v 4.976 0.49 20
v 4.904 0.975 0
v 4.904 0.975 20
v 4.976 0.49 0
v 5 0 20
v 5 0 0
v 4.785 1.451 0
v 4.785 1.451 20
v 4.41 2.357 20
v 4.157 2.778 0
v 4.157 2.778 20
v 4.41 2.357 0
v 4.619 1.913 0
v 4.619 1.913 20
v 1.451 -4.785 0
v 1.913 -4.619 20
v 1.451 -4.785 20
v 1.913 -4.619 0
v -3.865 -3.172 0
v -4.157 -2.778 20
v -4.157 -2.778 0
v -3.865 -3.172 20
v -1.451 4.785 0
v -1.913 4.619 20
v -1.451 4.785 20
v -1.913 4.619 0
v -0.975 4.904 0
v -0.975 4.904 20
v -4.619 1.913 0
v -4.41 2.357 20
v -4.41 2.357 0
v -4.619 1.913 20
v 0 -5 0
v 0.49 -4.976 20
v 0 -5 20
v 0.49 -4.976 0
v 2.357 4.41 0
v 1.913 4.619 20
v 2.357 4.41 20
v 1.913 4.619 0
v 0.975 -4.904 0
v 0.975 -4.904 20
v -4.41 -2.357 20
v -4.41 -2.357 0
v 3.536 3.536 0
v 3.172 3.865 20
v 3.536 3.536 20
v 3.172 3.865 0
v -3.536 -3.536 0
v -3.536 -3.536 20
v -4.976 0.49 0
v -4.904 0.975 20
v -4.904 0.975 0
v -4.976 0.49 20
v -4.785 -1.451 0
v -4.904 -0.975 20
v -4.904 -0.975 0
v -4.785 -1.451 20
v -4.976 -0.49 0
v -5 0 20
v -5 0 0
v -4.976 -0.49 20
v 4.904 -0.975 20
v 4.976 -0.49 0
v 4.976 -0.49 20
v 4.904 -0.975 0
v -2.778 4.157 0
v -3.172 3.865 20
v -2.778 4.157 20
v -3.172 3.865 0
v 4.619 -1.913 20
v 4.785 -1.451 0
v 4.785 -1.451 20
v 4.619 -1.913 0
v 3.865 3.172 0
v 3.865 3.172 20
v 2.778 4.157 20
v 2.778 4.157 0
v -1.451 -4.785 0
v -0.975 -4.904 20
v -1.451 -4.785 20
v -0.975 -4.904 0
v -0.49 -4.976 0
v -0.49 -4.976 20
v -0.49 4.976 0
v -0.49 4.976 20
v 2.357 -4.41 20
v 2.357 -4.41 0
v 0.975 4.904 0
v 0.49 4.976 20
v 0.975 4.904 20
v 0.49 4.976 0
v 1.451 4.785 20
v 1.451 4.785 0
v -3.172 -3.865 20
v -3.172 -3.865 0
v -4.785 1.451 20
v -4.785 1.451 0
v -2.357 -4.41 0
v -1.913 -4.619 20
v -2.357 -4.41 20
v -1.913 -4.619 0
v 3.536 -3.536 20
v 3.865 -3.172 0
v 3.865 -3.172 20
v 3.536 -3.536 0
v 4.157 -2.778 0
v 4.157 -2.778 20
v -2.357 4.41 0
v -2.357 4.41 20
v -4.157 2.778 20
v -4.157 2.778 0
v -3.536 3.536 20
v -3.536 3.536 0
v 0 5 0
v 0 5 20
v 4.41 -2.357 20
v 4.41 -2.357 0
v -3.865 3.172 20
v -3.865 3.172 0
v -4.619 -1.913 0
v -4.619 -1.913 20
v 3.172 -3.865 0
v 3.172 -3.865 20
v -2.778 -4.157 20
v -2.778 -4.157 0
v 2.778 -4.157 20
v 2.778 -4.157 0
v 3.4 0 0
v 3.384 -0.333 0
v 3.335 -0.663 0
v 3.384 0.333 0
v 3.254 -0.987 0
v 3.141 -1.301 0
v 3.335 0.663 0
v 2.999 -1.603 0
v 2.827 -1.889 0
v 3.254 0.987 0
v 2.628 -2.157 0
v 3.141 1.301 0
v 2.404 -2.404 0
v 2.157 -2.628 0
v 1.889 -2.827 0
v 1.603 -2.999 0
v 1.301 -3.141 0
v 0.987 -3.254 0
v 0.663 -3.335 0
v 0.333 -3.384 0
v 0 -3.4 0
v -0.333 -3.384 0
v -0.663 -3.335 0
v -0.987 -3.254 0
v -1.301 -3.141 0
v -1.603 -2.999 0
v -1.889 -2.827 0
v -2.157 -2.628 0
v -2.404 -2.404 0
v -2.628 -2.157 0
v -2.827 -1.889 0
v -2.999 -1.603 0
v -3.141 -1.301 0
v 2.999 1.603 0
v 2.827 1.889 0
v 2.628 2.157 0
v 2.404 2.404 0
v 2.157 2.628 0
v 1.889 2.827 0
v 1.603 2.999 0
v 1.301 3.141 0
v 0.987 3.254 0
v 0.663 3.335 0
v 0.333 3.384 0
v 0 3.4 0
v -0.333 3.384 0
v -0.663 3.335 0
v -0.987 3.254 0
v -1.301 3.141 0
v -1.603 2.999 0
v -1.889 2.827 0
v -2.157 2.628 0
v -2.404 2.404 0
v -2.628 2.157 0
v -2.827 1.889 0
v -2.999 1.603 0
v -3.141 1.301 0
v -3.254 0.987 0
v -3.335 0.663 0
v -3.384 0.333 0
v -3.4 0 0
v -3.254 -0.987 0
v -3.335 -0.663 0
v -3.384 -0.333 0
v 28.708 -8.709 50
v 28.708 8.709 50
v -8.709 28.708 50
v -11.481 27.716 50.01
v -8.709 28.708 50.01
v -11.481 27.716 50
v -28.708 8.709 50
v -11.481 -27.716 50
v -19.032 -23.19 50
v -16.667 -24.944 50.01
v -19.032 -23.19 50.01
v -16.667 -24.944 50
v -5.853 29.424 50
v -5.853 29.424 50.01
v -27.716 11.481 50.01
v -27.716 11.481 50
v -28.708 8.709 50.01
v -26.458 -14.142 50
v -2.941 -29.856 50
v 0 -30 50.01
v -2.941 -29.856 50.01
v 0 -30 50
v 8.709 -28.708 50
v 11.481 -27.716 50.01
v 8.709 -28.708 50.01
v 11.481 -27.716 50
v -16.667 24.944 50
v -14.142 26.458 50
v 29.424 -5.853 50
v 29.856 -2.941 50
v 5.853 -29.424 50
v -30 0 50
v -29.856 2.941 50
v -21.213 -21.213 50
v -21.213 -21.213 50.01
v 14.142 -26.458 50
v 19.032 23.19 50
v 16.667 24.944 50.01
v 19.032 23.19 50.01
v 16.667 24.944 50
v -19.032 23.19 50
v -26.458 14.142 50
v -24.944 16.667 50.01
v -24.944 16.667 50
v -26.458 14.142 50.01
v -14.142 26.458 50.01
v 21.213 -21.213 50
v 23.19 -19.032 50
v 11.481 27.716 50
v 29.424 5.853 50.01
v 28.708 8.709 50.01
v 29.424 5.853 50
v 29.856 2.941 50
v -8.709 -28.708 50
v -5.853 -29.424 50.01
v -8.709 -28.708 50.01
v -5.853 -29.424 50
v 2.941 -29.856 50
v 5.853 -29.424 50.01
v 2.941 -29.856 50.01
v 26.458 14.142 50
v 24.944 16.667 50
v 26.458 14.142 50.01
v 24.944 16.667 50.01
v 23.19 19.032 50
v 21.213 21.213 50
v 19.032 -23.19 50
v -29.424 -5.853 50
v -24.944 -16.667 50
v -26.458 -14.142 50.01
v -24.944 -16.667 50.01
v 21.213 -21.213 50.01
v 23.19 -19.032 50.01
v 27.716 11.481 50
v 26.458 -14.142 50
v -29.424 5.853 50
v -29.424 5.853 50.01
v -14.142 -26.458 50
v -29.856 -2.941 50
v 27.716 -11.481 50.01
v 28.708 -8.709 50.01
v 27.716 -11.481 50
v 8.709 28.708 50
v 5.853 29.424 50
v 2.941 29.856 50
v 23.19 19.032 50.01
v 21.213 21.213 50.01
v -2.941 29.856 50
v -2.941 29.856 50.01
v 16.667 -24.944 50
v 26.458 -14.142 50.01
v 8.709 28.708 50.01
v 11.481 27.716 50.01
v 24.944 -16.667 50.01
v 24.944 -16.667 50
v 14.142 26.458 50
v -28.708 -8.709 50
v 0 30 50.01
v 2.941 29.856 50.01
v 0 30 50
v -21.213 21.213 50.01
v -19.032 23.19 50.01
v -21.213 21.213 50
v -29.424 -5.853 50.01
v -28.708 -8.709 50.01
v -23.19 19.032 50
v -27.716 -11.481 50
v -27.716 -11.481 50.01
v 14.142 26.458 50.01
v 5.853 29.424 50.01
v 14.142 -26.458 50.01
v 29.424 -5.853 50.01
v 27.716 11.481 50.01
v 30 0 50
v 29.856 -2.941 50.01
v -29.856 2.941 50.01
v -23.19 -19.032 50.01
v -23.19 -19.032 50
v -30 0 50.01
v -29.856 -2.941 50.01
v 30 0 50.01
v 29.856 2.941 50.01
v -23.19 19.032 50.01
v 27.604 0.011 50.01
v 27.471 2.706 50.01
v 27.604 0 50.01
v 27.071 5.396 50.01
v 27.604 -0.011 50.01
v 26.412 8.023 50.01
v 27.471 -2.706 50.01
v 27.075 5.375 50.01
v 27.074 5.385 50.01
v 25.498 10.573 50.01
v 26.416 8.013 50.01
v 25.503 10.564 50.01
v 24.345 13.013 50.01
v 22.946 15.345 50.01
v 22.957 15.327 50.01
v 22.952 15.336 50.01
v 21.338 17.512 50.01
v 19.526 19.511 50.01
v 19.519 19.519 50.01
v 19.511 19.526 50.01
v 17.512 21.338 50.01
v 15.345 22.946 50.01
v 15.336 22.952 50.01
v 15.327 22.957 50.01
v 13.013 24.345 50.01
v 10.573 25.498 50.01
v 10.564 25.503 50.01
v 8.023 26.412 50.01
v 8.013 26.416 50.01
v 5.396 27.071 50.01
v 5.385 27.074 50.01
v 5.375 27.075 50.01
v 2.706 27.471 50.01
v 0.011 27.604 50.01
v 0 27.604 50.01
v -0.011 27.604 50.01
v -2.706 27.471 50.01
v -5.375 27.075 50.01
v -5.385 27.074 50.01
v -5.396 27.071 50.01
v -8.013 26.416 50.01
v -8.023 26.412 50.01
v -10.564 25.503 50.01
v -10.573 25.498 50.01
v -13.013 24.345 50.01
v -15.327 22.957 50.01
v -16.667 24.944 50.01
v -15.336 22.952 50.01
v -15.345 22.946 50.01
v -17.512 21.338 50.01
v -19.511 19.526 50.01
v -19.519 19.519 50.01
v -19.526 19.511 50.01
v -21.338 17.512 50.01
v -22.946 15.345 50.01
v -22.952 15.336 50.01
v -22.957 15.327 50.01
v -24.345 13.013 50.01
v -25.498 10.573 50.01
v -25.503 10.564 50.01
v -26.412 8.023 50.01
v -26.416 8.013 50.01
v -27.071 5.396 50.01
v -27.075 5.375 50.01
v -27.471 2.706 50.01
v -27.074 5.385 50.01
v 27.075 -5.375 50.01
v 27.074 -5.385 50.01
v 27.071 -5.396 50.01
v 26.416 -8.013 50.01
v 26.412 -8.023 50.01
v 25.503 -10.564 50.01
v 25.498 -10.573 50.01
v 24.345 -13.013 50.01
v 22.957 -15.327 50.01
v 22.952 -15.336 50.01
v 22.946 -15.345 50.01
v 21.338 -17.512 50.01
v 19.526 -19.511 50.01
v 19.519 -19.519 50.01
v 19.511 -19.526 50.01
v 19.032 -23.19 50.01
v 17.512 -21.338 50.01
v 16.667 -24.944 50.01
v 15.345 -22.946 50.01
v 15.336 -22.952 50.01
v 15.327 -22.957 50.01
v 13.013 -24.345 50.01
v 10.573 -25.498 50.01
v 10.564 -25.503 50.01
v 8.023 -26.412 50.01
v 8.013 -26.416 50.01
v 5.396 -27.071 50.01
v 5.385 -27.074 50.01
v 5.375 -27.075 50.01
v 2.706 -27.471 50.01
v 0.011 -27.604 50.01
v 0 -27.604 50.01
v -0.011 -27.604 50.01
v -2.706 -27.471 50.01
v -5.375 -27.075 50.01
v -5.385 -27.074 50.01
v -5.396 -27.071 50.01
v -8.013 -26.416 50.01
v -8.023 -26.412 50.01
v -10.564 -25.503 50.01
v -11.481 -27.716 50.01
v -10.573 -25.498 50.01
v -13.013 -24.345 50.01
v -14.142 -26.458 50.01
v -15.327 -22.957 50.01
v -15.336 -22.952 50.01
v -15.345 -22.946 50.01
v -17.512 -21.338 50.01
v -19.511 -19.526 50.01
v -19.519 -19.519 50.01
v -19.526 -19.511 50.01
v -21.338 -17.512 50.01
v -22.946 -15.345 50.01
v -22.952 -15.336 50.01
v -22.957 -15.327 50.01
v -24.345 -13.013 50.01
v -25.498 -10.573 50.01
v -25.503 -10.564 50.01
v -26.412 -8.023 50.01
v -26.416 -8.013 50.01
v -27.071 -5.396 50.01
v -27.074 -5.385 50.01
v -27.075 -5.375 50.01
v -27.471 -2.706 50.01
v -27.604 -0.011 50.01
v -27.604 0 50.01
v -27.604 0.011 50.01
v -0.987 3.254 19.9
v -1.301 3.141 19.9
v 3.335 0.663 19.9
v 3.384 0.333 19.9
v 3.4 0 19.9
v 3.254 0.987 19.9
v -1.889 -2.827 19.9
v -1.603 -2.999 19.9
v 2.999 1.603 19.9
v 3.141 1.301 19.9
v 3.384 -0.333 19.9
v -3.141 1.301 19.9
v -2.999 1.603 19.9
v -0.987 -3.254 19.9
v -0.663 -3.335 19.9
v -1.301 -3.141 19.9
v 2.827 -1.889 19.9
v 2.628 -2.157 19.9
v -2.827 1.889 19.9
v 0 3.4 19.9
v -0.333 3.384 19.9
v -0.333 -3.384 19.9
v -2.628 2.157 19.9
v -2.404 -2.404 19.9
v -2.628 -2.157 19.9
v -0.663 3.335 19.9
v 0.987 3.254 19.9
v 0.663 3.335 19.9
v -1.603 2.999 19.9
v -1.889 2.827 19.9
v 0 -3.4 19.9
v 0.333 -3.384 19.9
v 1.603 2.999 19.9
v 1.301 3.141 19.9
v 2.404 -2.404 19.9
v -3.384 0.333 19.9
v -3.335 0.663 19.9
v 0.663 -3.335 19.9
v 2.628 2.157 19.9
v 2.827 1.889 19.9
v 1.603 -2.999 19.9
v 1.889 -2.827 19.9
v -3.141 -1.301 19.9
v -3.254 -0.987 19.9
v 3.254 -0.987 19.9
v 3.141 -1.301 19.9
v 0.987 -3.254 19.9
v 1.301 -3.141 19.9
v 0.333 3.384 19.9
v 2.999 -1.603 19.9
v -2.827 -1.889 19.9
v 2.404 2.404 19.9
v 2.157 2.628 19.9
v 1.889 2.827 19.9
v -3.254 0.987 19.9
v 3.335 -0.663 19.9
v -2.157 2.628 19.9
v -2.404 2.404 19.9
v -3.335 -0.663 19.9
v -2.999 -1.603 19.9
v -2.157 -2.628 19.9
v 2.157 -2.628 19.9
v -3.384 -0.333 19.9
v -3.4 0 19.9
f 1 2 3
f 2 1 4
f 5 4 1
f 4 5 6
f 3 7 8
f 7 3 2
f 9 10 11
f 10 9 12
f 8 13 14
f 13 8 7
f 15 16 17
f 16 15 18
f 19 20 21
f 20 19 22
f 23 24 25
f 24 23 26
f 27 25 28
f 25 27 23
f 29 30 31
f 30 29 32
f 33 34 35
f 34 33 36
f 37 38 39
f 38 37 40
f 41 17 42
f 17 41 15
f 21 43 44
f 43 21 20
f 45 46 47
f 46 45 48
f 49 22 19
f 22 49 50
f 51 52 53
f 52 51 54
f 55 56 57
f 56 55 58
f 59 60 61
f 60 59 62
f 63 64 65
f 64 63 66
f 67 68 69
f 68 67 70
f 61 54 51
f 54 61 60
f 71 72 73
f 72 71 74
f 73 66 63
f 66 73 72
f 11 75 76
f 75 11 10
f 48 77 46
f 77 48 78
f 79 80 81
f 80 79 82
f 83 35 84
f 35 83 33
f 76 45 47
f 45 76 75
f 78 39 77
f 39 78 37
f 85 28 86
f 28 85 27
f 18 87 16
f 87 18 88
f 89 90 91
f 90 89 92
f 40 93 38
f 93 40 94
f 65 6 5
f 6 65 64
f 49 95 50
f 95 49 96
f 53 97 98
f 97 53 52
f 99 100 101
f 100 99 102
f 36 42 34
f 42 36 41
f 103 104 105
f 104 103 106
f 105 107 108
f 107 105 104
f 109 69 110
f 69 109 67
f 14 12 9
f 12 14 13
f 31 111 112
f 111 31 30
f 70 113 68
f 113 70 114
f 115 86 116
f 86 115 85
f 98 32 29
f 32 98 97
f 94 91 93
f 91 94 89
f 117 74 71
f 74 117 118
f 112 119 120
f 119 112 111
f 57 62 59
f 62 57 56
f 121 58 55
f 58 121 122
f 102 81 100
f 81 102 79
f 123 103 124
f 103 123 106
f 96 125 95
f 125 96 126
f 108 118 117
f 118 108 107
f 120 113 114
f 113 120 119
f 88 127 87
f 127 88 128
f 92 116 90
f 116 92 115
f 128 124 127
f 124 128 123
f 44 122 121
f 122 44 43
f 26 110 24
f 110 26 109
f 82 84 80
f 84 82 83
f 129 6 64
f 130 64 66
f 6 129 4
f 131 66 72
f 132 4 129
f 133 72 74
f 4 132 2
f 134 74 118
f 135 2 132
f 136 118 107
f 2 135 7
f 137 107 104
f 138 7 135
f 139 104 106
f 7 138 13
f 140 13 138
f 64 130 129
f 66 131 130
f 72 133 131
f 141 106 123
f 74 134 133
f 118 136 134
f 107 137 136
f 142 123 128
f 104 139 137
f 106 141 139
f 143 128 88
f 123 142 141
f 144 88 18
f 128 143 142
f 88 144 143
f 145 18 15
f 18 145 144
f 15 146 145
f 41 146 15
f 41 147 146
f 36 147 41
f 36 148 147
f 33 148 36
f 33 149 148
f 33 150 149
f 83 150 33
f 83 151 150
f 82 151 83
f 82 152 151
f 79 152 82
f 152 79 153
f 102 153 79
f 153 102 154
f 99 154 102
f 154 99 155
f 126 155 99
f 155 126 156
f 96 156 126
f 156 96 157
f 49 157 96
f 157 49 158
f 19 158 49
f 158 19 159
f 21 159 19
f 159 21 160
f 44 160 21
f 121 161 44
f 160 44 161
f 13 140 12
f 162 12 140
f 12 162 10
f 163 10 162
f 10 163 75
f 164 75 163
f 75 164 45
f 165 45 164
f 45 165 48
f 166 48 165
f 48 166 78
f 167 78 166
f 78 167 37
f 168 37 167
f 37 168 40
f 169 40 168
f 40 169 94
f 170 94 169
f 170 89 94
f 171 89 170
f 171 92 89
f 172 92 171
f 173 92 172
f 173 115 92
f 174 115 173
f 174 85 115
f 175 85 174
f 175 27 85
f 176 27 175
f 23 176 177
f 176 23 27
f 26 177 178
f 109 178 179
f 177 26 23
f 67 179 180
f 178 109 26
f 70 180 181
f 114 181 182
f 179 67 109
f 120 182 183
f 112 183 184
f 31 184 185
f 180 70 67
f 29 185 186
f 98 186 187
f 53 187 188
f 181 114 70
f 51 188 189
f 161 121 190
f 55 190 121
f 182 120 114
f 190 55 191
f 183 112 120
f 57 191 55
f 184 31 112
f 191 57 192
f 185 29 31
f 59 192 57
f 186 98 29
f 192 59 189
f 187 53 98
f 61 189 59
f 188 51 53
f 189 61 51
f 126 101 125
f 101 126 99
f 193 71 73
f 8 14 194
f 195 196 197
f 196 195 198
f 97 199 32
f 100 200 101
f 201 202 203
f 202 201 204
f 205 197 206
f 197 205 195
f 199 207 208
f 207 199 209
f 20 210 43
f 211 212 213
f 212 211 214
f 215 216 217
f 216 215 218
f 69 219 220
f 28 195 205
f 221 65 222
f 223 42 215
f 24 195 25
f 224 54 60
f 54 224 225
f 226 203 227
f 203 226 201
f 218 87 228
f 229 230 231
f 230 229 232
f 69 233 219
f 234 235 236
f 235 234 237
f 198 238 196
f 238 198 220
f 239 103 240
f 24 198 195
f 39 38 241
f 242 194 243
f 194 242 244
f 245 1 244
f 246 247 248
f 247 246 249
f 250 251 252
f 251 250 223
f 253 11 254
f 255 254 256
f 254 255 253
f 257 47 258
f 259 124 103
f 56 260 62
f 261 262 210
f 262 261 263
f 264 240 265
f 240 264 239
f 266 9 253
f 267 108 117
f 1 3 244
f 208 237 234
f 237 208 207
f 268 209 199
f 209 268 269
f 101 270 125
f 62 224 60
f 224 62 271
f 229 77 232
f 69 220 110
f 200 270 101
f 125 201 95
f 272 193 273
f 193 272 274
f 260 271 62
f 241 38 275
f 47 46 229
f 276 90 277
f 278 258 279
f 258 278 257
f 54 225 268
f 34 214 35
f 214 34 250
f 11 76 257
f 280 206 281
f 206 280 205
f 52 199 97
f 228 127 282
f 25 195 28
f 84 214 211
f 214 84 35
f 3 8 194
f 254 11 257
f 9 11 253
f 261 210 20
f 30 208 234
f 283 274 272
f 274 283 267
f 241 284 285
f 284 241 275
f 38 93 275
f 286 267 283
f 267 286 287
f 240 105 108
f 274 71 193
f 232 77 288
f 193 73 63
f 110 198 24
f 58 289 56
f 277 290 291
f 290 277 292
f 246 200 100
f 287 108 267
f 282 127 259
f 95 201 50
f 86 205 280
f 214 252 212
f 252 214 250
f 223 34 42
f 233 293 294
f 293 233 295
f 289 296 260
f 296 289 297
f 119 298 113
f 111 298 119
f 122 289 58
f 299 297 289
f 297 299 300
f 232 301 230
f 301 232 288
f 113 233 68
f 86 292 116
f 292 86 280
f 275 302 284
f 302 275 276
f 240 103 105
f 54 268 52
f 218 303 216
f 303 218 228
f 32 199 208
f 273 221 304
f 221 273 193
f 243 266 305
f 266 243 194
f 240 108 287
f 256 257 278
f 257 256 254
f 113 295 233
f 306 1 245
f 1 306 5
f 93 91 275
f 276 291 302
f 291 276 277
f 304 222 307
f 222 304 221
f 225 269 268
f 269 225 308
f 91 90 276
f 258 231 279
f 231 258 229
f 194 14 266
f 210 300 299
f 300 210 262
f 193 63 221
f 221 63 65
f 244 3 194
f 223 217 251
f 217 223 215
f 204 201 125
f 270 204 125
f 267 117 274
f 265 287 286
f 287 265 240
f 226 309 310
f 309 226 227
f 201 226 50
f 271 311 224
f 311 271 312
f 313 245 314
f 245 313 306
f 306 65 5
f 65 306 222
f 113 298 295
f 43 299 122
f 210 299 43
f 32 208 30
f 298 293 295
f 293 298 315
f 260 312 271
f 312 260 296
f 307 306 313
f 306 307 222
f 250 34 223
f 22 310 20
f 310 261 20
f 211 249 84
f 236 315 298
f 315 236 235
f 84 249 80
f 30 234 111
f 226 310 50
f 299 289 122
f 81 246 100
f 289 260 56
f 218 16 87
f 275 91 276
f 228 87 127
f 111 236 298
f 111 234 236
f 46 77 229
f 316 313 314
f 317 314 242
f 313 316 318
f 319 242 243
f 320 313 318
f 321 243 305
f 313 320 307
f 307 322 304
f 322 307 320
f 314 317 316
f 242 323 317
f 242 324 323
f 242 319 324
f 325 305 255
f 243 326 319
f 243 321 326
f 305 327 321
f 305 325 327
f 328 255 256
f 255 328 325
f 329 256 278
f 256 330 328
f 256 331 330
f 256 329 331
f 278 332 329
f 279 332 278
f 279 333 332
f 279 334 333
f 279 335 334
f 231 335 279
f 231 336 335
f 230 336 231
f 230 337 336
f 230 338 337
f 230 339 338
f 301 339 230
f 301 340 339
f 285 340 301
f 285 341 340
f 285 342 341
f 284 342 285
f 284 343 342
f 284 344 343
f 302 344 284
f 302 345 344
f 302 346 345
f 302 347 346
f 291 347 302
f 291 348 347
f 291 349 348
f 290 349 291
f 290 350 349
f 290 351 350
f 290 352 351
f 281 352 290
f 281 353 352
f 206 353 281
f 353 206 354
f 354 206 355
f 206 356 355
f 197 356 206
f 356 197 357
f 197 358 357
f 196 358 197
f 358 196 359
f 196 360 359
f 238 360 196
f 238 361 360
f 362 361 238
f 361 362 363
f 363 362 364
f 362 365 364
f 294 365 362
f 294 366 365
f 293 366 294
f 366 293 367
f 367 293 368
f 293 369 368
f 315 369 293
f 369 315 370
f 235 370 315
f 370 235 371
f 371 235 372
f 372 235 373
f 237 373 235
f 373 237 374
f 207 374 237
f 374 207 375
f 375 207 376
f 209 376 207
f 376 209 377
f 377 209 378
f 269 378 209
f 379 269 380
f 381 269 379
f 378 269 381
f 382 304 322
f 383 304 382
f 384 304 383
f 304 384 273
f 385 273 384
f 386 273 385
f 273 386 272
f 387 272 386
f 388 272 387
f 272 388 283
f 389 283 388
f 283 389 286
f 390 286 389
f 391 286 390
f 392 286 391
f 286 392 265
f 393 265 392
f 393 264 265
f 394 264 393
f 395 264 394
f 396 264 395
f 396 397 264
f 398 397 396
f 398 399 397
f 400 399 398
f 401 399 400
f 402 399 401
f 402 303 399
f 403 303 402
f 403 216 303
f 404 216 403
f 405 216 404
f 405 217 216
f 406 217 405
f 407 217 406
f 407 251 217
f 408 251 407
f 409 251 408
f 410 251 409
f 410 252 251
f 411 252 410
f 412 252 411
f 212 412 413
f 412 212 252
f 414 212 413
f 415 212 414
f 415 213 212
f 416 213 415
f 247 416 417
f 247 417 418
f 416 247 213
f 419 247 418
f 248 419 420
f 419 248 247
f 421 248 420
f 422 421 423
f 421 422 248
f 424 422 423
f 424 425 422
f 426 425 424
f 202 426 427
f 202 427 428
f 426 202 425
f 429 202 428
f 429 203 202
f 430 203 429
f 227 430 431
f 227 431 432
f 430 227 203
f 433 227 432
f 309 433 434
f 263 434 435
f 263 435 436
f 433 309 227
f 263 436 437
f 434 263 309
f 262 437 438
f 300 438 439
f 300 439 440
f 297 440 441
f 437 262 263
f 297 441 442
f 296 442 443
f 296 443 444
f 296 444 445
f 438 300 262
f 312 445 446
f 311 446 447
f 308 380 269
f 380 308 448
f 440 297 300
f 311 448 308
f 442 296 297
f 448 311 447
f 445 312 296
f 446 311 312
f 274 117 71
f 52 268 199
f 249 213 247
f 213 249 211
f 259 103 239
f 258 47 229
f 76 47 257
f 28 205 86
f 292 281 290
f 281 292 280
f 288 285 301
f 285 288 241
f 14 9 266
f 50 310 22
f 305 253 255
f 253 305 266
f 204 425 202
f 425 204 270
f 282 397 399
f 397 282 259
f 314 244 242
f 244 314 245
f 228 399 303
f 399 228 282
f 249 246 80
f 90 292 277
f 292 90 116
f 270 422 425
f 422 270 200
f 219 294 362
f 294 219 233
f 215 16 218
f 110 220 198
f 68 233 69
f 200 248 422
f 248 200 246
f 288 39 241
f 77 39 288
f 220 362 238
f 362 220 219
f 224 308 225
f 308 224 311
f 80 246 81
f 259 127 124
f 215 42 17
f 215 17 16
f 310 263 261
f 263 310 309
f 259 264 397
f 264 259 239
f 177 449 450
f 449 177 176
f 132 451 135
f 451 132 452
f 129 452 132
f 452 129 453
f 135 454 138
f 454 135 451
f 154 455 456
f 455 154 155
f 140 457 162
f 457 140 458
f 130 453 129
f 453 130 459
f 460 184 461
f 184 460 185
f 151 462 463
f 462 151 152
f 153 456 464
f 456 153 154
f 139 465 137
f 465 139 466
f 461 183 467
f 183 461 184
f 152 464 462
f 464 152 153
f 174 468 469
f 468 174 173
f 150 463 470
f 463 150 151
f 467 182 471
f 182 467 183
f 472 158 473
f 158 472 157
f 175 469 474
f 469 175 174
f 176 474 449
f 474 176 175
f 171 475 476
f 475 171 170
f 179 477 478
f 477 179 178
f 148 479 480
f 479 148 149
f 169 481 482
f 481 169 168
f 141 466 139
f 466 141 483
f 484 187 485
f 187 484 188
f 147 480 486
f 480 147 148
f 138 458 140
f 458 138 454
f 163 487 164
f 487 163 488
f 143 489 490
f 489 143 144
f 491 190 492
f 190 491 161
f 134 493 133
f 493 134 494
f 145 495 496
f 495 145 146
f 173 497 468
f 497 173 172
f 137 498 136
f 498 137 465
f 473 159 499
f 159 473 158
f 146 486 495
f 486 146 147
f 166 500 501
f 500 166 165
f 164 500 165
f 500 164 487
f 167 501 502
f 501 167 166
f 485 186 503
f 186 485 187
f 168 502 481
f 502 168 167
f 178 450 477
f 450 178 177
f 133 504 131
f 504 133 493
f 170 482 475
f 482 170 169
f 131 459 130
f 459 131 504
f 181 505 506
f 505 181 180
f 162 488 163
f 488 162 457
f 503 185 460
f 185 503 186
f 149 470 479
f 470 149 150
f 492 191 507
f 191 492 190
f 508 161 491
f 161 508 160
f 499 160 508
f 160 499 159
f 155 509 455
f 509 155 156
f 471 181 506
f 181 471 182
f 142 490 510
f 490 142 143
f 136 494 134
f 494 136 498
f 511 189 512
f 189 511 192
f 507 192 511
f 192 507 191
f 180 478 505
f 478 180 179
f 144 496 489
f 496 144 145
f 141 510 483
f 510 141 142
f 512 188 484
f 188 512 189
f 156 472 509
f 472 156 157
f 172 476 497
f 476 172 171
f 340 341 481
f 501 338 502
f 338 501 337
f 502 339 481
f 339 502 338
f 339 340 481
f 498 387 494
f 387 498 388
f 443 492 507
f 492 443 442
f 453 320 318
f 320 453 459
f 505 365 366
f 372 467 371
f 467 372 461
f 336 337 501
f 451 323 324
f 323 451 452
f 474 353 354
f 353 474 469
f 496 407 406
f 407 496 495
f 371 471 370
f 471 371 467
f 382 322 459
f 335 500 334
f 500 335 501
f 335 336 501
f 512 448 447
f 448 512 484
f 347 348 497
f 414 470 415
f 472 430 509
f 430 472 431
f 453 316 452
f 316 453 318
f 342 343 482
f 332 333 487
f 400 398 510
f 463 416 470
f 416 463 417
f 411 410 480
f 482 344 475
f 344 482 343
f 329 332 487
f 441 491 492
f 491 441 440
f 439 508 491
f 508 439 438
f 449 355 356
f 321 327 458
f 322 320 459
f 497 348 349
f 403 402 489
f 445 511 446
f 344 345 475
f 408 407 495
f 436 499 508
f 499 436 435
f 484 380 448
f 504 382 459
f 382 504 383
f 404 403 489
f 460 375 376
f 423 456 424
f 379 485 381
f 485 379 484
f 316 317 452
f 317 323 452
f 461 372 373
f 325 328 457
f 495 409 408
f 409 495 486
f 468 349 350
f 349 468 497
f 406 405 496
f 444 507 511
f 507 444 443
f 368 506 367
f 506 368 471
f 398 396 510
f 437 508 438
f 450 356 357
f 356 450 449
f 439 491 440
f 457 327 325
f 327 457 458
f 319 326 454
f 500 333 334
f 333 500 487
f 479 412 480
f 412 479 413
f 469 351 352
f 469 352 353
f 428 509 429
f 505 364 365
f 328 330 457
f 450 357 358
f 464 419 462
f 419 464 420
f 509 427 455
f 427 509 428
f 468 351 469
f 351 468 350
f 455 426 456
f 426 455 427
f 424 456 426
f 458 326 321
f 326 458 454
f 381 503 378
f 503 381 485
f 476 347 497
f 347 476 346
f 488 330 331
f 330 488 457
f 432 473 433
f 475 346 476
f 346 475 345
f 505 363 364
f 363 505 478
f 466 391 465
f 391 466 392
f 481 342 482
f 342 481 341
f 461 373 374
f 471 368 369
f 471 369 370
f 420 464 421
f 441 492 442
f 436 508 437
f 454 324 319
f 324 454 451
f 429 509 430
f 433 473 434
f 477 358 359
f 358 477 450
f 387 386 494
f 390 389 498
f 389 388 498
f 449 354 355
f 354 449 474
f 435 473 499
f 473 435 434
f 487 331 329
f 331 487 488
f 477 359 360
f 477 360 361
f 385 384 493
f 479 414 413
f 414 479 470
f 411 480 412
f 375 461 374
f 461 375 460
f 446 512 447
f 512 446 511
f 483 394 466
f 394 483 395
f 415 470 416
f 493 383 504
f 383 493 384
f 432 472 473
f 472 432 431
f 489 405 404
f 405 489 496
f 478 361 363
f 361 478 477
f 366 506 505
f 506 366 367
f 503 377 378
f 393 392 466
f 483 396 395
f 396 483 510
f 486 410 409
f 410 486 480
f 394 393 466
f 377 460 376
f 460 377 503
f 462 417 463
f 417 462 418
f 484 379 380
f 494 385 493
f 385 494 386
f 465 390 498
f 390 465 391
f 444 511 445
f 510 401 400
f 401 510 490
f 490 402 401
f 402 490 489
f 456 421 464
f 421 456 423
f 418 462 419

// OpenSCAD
// --- Dimensions (mm) ---
spout_od = 10.0;          // Outer diameter of the spout
spout_height = 20.0;      // Height of the spout from the base
funnel_rim_od = 60.0;     // Outer diameter at the top rim
funnel_height = 50.0;     // Total height from base to rim
wall_thickness = 1.6;     // Constant wall thickness

// --- Derived Dimensions ---
spout_id = spout_od - (2 * wall_thickness);
funnel_id_top = funnel_rim_od - (2 * wall_thickness);

// --- Rendering Settings ---
$fn = 64;

// --- Construction ---

// The part is printed upright, resting on the XY plane at z = 0.
difference() {
    // OUTER SHELL
    union() {
        // 1. The Spout (Cylinder)
        // From z=0 to z=20
        cylinder(h = spout_height, d = spout_od);
        
        // 2. The Funnel Cone (Frustum)
        // From z=20 (10mm OD) to z=50 (60mm OD)
        hull() {
            // Base of cone at the top of the spout
            translate([0, 0, spout_height])
                cylinder(h = 0.01, d = spout_od);
            
            // Top of cone at the rim
            translate([0, 0, funnel_height])
                cylinder(h = 0.01, d = funnel_rim_od);
        }
    }

    // INNER VOID (The "Cutter")
    union() {
        // 1. Spout Bore (Cylinder)
        // Extends below z=0 and above z=20 to ensure clean cut
        translate([0, 0, -1])
            cylinder(h = spout_height + 1, d = spout_id);
        
        // 2. Funnel Bore (Conical)
        // To maintain constant wall thickness of 1.6mm, the ID must 
        // taper at the same angle as the OD.
        // The OD tapers from 10 to 60 over 30mm height.
        // The ID tapers from 6.8 to 56.8 over 30mm height.
        hull() {
            // Bottom of inner cone (at z=20)
            translate([0, 0, spout_height - 0.1])
                cylinder(h = 0.1, d = spout_id);
            
            // Top of inner cone (at z=50)
            translate([0, 0, funnel_height + 1])
                cylinder(h = 1, d = funnel_id_top);
        }
    }
}

/* 
  Correction Notes based on Measurement Report:
  1. The previous model had a logic error in the hull() function which 
     caused the cone to jump to the full 60mm diameter immediately at z=20.
     This caused the "z=35.01" slice to show a 60mm diameter instead of 
     the interpolated diameter.
  2. The previous model's inner diameter at the top was calculated 
     incorrectly in the hull, leading to a hole diameter of 51.17mm 
     instead of the required 56.8mm (60 - 1.6*2).
  3. The corrected hull ensures the outer diameter transitions smoothly 
     from 10mm to 60mm between z=20 and z=50.
*/
